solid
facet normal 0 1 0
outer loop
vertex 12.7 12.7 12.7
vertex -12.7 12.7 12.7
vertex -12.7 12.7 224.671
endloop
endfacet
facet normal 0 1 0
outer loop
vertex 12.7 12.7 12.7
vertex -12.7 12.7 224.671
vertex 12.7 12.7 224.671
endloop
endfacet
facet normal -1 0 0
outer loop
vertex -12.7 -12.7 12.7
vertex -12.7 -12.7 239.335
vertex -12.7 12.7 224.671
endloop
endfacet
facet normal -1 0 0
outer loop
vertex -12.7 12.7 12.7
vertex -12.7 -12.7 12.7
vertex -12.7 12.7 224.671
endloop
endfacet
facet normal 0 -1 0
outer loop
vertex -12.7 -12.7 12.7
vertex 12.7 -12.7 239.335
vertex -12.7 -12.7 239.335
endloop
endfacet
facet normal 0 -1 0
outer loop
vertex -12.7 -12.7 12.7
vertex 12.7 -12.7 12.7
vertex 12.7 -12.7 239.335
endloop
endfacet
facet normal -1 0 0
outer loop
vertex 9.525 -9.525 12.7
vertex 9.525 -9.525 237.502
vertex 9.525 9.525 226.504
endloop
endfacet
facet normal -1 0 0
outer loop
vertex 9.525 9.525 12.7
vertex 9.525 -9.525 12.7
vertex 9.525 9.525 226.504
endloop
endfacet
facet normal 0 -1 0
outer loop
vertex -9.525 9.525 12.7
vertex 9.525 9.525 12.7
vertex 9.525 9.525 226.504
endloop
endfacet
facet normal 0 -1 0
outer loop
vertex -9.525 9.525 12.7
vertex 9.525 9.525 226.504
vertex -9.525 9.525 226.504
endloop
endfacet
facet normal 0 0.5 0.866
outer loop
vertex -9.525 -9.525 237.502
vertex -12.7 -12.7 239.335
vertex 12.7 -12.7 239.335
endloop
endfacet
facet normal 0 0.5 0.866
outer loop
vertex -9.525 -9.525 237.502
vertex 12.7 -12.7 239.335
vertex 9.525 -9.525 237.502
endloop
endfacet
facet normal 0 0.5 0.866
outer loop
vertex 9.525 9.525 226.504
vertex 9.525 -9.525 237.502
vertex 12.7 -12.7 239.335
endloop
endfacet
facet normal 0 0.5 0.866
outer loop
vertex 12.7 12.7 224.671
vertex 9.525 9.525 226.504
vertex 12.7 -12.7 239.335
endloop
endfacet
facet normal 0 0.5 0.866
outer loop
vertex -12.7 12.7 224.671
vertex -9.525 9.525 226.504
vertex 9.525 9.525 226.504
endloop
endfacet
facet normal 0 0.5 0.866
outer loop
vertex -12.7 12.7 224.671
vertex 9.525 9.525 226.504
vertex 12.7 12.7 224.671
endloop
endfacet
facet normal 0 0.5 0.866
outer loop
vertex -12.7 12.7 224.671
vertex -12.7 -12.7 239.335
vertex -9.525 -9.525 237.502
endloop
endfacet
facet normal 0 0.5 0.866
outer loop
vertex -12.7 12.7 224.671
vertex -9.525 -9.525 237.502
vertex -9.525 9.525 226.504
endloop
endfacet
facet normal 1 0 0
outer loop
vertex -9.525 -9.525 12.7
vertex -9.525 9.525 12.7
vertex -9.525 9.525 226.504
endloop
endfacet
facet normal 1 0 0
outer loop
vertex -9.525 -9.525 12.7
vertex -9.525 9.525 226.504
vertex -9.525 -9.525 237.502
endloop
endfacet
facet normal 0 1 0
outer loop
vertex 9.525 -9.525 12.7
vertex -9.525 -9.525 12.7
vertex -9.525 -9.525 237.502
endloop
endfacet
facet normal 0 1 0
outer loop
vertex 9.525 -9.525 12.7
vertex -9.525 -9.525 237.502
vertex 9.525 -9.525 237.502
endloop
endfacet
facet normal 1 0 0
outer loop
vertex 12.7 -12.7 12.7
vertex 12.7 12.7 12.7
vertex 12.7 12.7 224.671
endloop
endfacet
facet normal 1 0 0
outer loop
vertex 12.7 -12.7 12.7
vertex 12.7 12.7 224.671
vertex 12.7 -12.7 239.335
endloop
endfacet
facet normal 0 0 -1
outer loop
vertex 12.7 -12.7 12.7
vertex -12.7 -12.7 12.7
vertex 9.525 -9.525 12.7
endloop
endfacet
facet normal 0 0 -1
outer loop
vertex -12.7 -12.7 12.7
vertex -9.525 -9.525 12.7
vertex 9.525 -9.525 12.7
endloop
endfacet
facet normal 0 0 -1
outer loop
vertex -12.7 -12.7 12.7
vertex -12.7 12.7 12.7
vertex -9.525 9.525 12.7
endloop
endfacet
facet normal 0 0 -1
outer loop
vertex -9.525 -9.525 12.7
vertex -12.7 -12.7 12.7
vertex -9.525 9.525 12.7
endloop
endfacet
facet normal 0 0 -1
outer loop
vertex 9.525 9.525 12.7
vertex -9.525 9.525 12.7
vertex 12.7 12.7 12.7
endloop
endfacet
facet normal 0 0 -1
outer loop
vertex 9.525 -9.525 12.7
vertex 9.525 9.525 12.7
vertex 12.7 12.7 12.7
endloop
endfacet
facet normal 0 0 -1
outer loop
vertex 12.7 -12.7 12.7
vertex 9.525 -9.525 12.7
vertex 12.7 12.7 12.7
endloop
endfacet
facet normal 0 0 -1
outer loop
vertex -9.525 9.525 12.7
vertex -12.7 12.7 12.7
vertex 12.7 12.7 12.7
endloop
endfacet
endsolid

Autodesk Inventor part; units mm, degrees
ref_plane "Start Plane" through (0, 0, 12.7) normal (0, 0, 1) x (1, 0, 0)
ref_plane "End Plane" through (0, 0, 239.3353) normal (0, 0, 1) x (1, 0, 0)
sketch "Sketch" plane through (0, 0, 0) normal (0, 0, 1) x (1, 0, 0)
  line L0 (-12.7, 12.7) -> (12.7, 12.7)
  line L1 (12.7, 12.7) -> (12.7, -12.7)
  line L2 (12.7, -12.7) -> (-12.7, -12.7)
  line L3 (-12.7, -12.7) -> (-12.7, 12.7)
  line L4 (9.525, 9.525) -> (-9.525, 9.525)
  line L5 (-9.525, 9.525) -> (-9.525, -9.525)
  line L6 (-9.525, -9.525) -> (9.525, -9.525)
  line L7 (9.525, -9.525) -> (9.525, 9.525)
  point P0 (0, 0)
  point P1 (0, 12.7)
  point P2 (-12.7, 0)
  dimension "width" = 25.4
  dimension "d1" = 3.175
extrude "Body" add sketch "Sketch" along normal up to surface (226.6353 mm away) from surface at 12.7
sketch "Sketch4" plane through (0, 0, 0) normal (0, 0, 1) x (1, 0, 0)
  line L0 (0, 0) -> (10, 0)
ref_plane "Work Plane4" through (0, 0, 0) normal (0, -1, 0) x (1, 0, 0)
sketch "Sketch5" plane through (0, 0, 0) normal (0, -1, 0) x (1, 0, 0)
  line L0 (-2, 12.7) -> (12, 12.7)
  line L1 (-2, 239.3353) -> (12, 239.3353)
  dimension "d9" = 226.6353
ref_plane "Work Plane5" through (19.05, 56.4661, 199.4022) normal (0, 0.5, 0.866) x (1, 0, 0)
split "Split1" plane through (19.05, 56.4661, 199.4022) removes the side toward (0, 0.5, 0.866)
ref_plane "Work Plane6" through (0, 12.7, 12.7) normal (0, 0, -1) x (-1, 0, 0)
split "Split2" plane through (0, 12.7, 12.7) removes the side toward (0, 0, -1)
equation "\"G_OFFSET_START\" = -12.7"
equation "\"G_OFFSET_END\" = -14.6647"
equation "\"d4\" = -G_OFFSET_START"
equation "\"d5\" = length + G_OFFSET_END"
equation "\"G_L\" = 254"
equation "\"length\" = 254"
properties part number "Square Tube Profile" material "Aluminum-6061"
